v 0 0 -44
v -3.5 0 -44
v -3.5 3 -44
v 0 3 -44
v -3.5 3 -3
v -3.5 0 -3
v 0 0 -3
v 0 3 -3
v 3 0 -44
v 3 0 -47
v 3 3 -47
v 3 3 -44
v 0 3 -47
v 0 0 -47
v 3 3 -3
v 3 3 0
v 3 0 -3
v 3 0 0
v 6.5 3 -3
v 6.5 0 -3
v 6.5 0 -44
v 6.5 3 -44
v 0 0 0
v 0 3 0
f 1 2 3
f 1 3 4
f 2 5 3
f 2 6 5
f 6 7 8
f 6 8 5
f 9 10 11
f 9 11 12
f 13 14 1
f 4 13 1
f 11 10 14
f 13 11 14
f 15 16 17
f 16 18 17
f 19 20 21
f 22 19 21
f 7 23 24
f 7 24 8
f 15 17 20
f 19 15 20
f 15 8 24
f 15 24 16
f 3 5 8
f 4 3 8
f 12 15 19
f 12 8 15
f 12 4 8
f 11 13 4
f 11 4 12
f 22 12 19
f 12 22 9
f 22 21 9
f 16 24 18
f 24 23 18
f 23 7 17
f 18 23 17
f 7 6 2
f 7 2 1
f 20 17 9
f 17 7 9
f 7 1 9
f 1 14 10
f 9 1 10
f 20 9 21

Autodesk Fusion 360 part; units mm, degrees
sketch "Skizze1" plane through (0, 0, 0) normal (0, 1, 0) x (1, 0, 0)
  line L0 (0, 0) -> (3, 0)
  line L1 (3, 0) -> (3, 3)
  line L2 (0, 0) -> (0, 3)
  line L3 (3, 3) -> (6.5, 3)
  line L4 (6.5, 3) -> (6.5, 3.4599)
  line L5 (0, 3) -> (-3.5, 3)
  line L6 (1.5, 0) -> (1.5, 47)
  line L7 (1.5, 47) -> (3, 47)
  line L8 (3, 47) -> (0, 47)
  line L9 (0, 47) -> (0, 44)
  line L10 (3, 47) -> (3, 44)
  line L11 (6.5, 3) -> (6.5, 44)
  line L12 (6.5, 44) -> (3, 44)
  line L13 (-3.5, 3) -> (-3.5, 44)
  line L14 (-3.5, 44) -> (0, 44)
  dimension "d1" = 3
  dimension "d2" = 3
  dimension "d3" = 3
  dimension "d4" = 3.5
  dimension "d5" = 3.5
  dimension "d6" = 47
  dimension "d7" = 1.5
  dimension "d8" = 3
  dimension "d9" = 3
extrude "Extrusion1" add sketch "Skizze1" along normal blind 3
